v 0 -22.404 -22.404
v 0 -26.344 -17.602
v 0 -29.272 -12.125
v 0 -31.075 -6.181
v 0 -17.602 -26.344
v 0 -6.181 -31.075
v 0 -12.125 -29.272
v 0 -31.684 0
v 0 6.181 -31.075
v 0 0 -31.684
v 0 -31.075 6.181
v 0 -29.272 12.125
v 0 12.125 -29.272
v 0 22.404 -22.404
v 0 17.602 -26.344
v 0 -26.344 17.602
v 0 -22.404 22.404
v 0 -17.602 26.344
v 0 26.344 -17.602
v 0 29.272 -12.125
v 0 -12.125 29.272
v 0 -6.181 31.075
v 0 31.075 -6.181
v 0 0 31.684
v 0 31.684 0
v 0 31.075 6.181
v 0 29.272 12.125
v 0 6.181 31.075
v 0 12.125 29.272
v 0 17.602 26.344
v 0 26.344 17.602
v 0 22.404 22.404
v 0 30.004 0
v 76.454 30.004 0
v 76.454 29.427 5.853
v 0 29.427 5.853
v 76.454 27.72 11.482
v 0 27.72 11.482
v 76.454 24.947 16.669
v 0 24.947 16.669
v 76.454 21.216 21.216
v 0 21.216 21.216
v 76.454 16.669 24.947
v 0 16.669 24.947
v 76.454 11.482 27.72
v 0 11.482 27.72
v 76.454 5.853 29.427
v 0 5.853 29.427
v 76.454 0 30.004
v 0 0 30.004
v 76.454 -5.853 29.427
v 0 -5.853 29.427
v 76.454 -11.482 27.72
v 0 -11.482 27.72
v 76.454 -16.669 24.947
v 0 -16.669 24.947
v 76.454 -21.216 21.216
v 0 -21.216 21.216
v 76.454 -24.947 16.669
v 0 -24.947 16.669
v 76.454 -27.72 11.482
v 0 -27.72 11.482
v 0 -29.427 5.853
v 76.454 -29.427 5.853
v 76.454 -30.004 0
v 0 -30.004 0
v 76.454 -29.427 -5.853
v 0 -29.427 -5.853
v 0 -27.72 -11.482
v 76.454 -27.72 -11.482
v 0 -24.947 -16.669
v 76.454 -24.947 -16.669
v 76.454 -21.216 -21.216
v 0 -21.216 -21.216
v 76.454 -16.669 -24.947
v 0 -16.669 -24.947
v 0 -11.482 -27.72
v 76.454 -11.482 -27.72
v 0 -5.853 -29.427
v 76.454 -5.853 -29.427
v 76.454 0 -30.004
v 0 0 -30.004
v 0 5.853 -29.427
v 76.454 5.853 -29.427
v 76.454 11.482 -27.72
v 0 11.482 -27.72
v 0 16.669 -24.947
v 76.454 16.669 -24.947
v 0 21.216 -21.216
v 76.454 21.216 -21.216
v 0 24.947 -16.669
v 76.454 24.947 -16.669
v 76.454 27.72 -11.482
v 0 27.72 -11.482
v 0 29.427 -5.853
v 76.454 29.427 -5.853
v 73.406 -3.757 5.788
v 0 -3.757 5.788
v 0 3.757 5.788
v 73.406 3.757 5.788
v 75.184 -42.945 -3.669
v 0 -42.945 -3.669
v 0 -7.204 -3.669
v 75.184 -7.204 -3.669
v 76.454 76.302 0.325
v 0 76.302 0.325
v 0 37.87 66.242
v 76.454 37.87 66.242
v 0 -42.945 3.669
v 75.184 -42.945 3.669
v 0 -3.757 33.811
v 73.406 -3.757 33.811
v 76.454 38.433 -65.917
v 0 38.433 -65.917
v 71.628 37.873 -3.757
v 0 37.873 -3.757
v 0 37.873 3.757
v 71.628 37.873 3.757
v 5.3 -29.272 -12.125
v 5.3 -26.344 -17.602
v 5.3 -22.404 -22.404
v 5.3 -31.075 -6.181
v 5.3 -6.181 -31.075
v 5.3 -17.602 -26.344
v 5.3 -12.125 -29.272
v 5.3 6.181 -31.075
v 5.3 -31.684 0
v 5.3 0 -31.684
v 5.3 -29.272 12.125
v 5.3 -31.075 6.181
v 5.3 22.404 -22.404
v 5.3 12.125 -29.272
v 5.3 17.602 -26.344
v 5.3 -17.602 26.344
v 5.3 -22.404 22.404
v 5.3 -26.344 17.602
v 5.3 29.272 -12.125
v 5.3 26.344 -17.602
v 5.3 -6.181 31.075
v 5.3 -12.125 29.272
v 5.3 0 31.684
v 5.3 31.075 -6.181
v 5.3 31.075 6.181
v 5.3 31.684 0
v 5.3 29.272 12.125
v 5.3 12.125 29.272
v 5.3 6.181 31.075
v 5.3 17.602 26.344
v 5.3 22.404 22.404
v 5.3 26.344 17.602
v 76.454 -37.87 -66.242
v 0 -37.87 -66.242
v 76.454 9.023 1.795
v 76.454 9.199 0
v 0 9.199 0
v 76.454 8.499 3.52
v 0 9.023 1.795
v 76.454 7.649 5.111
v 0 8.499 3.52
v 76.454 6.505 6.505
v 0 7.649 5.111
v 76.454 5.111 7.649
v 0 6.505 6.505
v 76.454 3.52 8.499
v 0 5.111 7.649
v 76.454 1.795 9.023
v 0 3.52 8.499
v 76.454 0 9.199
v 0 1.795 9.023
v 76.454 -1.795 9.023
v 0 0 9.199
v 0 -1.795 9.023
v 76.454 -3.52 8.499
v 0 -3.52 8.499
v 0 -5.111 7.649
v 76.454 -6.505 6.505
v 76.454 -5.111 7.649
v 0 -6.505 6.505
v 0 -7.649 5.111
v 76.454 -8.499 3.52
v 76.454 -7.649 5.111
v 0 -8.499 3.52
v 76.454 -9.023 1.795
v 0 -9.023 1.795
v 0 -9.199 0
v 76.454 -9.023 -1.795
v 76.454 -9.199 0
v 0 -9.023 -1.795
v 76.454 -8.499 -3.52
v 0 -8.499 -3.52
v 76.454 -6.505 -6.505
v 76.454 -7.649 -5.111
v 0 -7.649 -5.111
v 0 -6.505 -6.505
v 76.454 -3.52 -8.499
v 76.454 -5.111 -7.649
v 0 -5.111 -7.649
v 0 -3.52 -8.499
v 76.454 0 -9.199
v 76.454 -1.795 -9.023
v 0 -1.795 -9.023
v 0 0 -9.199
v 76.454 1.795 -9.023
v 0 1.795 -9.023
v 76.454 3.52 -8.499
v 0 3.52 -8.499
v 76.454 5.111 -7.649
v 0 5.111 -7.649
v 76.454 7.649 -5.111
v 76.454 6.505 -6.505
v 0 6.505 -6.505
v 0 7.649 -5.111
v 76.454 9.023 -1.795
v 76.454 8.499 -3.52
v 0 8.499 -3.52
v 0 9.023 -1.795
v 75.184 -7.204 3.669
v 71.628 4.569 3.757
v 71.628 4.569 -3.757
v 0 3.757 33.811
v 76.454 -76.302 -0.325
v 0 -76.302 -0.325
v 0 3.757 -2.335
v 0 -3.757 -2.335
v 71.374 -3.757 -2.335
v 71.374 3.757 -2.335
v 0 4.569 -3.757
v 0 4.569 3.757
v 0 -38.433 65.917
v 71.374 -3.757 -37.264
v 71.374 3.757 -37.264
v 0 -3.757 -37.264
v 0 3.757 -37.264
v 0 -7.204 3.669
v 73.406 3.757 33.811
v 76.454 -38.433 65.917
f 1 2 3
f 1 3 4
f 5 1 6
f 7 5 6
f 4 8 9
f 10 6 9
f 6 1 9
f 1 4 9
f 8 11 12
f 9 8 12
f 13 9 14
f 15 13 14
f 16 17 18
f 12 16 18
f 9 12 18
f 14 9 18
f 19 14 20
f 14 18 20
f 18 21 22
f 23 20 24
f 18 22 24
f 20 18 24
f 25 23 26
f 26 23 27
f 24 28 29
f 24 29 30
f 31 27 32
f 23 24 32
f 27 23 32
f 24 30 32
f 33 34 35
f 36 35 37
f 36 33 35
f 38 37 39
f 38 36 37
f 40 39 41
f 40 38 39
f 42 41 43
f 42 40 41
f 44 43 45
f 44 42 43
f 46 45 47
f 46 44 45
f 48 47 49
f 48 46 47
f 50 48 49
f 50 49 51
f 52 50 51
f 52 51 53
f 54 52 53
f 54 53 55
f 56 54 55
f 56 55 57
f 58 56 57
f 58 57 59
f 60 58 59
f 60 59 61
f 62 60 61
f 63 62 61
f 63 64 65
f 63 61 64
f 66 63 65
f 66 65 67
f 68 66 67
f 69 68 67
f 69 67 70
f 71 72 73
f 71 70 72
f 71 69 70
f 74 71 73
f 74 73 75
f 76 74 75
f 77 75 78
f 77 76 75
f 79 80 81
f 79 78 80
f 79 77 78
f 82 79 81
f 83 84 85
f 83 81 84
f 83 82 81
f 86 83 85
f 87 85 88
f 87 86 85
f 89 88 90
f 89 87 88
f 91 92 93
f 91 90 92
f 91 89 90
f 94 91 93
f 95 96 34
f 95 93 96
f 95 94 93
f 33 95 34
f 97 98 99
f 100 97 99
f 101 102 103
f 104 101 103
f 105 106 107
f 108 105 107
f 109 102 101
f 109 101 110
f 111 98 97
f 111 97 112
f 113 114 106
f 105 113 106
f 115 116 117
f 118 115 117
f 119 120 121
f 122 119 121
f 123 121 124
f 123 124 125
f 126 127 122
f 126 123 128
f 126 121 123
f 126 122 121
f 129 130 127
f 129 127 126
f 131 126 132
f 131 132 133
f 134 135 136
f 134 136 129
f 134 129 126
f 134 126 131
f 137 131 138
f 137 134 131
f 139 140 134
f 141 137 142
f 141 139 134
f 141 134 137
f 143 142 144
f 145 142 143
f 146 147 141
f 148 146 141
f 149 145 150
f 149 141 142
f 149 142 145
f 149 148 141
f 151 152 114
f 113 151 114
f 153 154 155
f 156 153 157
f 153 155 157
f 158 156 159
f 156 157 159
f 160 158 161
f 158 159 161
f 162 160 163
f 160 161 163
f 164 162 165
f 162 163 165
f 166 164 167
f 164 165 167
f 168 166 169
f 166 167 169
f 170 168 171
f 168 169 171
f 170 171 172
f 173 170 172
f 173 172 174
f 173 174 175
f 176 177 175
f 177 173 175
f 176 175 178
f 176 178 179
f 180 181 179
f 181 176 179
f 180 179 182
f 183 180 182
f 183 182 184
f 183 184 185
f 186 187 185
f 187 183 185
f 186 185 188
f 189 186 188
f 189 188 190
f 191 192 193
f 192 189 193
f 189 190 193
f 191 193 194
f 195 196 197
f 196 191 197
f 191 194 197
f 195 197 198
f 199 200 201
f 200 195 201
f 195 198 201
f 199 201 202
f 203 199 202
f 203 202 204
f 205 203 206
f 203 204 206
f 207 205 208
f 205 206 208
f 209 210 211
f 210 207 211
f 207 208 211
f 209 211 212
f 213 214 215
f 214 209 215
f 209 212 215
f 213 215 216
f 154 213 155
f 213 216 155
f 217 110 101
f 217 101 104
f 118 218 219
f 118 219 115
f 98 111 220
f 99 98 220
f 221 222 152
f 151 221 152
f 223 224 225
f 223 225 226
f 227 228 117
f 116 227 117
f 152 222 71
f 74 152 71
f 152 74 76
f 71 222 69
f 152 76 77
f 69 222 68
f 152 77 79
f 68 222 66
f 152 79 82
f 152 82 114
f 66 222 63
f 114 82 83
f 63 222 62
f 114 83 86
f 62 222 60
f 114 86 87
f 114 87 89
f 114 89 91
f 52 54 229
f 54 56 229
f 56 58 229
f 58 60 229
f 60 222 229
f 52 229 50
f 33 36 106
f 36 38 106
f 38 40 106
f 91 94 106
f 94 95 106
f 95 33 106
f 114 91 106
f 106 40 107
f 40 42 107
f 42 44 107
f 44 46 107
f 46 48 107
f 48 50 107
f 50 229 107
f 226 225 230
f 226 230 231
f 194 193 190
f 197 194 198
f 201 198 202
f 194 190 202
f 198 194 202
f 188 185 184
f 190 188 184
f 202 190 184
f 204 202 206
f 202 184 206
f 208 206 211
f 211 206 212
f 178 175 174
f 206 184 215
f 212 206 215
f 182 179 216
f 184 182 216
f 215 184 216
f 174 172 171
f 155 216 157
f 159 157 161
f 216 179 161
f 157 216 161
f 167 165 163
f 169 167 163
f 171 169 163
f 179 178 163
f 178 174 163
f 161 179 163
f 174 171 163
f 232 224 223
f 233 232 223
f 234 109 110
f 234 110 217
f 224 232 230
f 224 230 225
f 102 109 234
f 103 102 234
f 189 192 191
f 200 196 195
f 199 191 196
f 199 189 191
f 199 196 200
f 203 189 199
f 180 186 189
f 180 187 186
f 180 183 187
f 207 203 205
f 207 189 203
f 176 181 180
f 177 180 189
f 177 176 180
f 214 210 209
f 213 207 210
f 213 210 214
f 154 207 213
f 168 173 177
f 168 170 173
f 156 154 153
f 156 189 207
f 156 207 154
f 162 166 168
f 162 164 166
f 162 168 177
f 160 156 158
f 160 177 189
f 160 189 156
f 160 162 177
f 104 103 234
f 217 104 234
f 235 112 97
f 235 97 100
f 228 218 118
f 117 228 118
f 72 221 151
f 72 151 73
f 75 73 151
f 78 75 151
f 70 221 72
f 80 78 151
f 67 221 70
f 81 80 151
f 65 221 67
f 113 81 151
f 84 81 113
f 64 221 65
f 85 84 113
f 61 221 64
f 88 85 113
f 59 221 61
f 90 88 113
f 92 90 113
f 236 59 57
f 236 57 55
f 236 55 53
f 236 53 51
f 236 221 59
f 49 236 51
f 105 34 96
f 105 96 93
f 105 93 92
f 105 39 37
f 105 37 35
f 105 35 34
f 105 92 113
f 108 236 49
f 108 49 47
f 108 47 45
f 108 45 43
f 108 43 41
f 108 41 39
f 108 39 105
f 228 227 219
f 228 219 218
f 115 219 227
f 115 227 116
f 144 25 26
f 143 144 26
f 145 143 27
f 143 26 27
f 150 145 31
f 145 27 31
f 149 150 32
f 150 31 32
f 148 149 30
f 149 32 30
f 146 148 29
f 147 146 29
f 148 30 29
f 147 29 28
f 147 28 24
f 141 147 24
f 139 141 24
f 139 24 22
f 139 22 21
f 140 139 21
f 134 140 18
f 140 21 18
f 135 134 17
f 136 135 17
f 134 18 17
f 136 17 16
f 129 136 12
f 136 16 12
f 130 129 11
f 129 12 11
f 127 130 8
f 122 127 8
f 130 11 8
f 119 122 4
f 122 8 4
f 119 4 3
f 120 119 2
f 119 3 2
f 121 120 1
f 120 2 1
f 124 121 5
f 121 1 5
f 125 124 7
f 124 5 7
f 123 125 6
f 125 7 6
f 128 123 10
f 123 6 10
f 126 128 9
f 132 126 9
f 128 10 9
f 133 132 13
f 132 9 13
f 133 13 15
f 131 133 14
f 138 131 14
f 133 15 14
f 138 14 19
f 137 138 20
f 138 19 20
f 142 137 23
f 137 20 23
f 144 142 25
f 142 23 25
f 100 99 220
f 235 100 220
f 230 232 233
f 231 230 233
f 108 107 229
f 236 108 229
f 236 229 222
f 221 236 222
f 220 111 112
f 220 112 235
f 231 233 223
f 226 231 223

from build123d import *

# Parameters (mm, degrees)
F1_DEPTH  = 76.454
F2_R      = 30.0040123815
F2_R_2    = 9.199471782
F3_DEPTH  = 91.694
F4_W      = 35.7405124232
F4_H      = 7.3380223475
F5_DEPTH  = 75.184
F6_W      = 7.5136311352
F6_H      = 28.0238082632
F7_DEPTH  = 73.406
F8_W      = 7.5136311352
F8_H      = 34.9282254465
F9_DEPTH  = 71.374
F10_W     = 33.3036547527
F10_H     = 7.5136297382
F11_DEPTH = 71.628
F14_R     = 31.6835181621
F15_DEPTH = 5.3


# Not quite as in the source:
# - the program builds the solid bodies; features that only make, move or delete a surface that nothing else refers to are left out


with BuildPart() as f1:
    # F0 (on Right) → F1 (new body)
    with BuildSketch(Plane.YZ):
        Polygon((38.4328120877, -65.9171635344), (76.30234421, 0.3252098396), (37.8695321224, 66.242373374), (-38.4328120877, 65.9171635344), (-76.30234421, -0.3252098396), (-37.8695321224, -66.242373374), align=None)
    extrude(amount=F1_DEPTH)

    # F2 (on Right) → F3 (cut)
    with BuildSketch(Plane.YZ):
        Circle(F2_R)
        Circle(F2_R_2, mode=Mode.SUBTRACT)
    extrude(amount=F3_DEPTH, mode=Mode.SUBTRACT)


with BuildPart() as f5:
    # F4 (on Right) → F5 (new body)
    with BuildSketch(Plane.YZ):
        with Locations((-25.0746384263, 0)):
            Rectangle(F4_W, F4_H)
    extrude(amount=F5_DEPTH)


with BuildPart() as f7:
    # F6 (on Right) → F7 (new body)
    with BuildSketch(Plane.YZ):
        with Locations((0, 19.7994299233)):
            Rectangle(F6_W, F6_H)
    extrude(amount=F7_DEPTH)


with BuildPart() as f9:
    # F8 (on Right) → F9 (new body)
    with BuildSketch(Plane.YZ):
        with Locations((0, -19.7994299233)):
            Rectangle(F8_W, F8_H)
    extrude(amount=F9_DEPTH)


with BuildPart() as f11:
    # F10 (on Right) → F11 (new body)
    with BuildSketch(Plane.YZ):
        with Locations((21.2209261954, 0)):
            Rectangle(F10_W, F10_H)
    extrude(amount=F11_DEPTH)


with BuildPart() as f15:
    # F14 (on Right) → F15 (new body)
    with BuildSketch(Plane.YZ):
        Circle(F14_R)
    extrude(amount=F15_DEPTH)


solid = Compound([f1.part, f5.part, f7.part, f9.part, f11.part, f15.part])
